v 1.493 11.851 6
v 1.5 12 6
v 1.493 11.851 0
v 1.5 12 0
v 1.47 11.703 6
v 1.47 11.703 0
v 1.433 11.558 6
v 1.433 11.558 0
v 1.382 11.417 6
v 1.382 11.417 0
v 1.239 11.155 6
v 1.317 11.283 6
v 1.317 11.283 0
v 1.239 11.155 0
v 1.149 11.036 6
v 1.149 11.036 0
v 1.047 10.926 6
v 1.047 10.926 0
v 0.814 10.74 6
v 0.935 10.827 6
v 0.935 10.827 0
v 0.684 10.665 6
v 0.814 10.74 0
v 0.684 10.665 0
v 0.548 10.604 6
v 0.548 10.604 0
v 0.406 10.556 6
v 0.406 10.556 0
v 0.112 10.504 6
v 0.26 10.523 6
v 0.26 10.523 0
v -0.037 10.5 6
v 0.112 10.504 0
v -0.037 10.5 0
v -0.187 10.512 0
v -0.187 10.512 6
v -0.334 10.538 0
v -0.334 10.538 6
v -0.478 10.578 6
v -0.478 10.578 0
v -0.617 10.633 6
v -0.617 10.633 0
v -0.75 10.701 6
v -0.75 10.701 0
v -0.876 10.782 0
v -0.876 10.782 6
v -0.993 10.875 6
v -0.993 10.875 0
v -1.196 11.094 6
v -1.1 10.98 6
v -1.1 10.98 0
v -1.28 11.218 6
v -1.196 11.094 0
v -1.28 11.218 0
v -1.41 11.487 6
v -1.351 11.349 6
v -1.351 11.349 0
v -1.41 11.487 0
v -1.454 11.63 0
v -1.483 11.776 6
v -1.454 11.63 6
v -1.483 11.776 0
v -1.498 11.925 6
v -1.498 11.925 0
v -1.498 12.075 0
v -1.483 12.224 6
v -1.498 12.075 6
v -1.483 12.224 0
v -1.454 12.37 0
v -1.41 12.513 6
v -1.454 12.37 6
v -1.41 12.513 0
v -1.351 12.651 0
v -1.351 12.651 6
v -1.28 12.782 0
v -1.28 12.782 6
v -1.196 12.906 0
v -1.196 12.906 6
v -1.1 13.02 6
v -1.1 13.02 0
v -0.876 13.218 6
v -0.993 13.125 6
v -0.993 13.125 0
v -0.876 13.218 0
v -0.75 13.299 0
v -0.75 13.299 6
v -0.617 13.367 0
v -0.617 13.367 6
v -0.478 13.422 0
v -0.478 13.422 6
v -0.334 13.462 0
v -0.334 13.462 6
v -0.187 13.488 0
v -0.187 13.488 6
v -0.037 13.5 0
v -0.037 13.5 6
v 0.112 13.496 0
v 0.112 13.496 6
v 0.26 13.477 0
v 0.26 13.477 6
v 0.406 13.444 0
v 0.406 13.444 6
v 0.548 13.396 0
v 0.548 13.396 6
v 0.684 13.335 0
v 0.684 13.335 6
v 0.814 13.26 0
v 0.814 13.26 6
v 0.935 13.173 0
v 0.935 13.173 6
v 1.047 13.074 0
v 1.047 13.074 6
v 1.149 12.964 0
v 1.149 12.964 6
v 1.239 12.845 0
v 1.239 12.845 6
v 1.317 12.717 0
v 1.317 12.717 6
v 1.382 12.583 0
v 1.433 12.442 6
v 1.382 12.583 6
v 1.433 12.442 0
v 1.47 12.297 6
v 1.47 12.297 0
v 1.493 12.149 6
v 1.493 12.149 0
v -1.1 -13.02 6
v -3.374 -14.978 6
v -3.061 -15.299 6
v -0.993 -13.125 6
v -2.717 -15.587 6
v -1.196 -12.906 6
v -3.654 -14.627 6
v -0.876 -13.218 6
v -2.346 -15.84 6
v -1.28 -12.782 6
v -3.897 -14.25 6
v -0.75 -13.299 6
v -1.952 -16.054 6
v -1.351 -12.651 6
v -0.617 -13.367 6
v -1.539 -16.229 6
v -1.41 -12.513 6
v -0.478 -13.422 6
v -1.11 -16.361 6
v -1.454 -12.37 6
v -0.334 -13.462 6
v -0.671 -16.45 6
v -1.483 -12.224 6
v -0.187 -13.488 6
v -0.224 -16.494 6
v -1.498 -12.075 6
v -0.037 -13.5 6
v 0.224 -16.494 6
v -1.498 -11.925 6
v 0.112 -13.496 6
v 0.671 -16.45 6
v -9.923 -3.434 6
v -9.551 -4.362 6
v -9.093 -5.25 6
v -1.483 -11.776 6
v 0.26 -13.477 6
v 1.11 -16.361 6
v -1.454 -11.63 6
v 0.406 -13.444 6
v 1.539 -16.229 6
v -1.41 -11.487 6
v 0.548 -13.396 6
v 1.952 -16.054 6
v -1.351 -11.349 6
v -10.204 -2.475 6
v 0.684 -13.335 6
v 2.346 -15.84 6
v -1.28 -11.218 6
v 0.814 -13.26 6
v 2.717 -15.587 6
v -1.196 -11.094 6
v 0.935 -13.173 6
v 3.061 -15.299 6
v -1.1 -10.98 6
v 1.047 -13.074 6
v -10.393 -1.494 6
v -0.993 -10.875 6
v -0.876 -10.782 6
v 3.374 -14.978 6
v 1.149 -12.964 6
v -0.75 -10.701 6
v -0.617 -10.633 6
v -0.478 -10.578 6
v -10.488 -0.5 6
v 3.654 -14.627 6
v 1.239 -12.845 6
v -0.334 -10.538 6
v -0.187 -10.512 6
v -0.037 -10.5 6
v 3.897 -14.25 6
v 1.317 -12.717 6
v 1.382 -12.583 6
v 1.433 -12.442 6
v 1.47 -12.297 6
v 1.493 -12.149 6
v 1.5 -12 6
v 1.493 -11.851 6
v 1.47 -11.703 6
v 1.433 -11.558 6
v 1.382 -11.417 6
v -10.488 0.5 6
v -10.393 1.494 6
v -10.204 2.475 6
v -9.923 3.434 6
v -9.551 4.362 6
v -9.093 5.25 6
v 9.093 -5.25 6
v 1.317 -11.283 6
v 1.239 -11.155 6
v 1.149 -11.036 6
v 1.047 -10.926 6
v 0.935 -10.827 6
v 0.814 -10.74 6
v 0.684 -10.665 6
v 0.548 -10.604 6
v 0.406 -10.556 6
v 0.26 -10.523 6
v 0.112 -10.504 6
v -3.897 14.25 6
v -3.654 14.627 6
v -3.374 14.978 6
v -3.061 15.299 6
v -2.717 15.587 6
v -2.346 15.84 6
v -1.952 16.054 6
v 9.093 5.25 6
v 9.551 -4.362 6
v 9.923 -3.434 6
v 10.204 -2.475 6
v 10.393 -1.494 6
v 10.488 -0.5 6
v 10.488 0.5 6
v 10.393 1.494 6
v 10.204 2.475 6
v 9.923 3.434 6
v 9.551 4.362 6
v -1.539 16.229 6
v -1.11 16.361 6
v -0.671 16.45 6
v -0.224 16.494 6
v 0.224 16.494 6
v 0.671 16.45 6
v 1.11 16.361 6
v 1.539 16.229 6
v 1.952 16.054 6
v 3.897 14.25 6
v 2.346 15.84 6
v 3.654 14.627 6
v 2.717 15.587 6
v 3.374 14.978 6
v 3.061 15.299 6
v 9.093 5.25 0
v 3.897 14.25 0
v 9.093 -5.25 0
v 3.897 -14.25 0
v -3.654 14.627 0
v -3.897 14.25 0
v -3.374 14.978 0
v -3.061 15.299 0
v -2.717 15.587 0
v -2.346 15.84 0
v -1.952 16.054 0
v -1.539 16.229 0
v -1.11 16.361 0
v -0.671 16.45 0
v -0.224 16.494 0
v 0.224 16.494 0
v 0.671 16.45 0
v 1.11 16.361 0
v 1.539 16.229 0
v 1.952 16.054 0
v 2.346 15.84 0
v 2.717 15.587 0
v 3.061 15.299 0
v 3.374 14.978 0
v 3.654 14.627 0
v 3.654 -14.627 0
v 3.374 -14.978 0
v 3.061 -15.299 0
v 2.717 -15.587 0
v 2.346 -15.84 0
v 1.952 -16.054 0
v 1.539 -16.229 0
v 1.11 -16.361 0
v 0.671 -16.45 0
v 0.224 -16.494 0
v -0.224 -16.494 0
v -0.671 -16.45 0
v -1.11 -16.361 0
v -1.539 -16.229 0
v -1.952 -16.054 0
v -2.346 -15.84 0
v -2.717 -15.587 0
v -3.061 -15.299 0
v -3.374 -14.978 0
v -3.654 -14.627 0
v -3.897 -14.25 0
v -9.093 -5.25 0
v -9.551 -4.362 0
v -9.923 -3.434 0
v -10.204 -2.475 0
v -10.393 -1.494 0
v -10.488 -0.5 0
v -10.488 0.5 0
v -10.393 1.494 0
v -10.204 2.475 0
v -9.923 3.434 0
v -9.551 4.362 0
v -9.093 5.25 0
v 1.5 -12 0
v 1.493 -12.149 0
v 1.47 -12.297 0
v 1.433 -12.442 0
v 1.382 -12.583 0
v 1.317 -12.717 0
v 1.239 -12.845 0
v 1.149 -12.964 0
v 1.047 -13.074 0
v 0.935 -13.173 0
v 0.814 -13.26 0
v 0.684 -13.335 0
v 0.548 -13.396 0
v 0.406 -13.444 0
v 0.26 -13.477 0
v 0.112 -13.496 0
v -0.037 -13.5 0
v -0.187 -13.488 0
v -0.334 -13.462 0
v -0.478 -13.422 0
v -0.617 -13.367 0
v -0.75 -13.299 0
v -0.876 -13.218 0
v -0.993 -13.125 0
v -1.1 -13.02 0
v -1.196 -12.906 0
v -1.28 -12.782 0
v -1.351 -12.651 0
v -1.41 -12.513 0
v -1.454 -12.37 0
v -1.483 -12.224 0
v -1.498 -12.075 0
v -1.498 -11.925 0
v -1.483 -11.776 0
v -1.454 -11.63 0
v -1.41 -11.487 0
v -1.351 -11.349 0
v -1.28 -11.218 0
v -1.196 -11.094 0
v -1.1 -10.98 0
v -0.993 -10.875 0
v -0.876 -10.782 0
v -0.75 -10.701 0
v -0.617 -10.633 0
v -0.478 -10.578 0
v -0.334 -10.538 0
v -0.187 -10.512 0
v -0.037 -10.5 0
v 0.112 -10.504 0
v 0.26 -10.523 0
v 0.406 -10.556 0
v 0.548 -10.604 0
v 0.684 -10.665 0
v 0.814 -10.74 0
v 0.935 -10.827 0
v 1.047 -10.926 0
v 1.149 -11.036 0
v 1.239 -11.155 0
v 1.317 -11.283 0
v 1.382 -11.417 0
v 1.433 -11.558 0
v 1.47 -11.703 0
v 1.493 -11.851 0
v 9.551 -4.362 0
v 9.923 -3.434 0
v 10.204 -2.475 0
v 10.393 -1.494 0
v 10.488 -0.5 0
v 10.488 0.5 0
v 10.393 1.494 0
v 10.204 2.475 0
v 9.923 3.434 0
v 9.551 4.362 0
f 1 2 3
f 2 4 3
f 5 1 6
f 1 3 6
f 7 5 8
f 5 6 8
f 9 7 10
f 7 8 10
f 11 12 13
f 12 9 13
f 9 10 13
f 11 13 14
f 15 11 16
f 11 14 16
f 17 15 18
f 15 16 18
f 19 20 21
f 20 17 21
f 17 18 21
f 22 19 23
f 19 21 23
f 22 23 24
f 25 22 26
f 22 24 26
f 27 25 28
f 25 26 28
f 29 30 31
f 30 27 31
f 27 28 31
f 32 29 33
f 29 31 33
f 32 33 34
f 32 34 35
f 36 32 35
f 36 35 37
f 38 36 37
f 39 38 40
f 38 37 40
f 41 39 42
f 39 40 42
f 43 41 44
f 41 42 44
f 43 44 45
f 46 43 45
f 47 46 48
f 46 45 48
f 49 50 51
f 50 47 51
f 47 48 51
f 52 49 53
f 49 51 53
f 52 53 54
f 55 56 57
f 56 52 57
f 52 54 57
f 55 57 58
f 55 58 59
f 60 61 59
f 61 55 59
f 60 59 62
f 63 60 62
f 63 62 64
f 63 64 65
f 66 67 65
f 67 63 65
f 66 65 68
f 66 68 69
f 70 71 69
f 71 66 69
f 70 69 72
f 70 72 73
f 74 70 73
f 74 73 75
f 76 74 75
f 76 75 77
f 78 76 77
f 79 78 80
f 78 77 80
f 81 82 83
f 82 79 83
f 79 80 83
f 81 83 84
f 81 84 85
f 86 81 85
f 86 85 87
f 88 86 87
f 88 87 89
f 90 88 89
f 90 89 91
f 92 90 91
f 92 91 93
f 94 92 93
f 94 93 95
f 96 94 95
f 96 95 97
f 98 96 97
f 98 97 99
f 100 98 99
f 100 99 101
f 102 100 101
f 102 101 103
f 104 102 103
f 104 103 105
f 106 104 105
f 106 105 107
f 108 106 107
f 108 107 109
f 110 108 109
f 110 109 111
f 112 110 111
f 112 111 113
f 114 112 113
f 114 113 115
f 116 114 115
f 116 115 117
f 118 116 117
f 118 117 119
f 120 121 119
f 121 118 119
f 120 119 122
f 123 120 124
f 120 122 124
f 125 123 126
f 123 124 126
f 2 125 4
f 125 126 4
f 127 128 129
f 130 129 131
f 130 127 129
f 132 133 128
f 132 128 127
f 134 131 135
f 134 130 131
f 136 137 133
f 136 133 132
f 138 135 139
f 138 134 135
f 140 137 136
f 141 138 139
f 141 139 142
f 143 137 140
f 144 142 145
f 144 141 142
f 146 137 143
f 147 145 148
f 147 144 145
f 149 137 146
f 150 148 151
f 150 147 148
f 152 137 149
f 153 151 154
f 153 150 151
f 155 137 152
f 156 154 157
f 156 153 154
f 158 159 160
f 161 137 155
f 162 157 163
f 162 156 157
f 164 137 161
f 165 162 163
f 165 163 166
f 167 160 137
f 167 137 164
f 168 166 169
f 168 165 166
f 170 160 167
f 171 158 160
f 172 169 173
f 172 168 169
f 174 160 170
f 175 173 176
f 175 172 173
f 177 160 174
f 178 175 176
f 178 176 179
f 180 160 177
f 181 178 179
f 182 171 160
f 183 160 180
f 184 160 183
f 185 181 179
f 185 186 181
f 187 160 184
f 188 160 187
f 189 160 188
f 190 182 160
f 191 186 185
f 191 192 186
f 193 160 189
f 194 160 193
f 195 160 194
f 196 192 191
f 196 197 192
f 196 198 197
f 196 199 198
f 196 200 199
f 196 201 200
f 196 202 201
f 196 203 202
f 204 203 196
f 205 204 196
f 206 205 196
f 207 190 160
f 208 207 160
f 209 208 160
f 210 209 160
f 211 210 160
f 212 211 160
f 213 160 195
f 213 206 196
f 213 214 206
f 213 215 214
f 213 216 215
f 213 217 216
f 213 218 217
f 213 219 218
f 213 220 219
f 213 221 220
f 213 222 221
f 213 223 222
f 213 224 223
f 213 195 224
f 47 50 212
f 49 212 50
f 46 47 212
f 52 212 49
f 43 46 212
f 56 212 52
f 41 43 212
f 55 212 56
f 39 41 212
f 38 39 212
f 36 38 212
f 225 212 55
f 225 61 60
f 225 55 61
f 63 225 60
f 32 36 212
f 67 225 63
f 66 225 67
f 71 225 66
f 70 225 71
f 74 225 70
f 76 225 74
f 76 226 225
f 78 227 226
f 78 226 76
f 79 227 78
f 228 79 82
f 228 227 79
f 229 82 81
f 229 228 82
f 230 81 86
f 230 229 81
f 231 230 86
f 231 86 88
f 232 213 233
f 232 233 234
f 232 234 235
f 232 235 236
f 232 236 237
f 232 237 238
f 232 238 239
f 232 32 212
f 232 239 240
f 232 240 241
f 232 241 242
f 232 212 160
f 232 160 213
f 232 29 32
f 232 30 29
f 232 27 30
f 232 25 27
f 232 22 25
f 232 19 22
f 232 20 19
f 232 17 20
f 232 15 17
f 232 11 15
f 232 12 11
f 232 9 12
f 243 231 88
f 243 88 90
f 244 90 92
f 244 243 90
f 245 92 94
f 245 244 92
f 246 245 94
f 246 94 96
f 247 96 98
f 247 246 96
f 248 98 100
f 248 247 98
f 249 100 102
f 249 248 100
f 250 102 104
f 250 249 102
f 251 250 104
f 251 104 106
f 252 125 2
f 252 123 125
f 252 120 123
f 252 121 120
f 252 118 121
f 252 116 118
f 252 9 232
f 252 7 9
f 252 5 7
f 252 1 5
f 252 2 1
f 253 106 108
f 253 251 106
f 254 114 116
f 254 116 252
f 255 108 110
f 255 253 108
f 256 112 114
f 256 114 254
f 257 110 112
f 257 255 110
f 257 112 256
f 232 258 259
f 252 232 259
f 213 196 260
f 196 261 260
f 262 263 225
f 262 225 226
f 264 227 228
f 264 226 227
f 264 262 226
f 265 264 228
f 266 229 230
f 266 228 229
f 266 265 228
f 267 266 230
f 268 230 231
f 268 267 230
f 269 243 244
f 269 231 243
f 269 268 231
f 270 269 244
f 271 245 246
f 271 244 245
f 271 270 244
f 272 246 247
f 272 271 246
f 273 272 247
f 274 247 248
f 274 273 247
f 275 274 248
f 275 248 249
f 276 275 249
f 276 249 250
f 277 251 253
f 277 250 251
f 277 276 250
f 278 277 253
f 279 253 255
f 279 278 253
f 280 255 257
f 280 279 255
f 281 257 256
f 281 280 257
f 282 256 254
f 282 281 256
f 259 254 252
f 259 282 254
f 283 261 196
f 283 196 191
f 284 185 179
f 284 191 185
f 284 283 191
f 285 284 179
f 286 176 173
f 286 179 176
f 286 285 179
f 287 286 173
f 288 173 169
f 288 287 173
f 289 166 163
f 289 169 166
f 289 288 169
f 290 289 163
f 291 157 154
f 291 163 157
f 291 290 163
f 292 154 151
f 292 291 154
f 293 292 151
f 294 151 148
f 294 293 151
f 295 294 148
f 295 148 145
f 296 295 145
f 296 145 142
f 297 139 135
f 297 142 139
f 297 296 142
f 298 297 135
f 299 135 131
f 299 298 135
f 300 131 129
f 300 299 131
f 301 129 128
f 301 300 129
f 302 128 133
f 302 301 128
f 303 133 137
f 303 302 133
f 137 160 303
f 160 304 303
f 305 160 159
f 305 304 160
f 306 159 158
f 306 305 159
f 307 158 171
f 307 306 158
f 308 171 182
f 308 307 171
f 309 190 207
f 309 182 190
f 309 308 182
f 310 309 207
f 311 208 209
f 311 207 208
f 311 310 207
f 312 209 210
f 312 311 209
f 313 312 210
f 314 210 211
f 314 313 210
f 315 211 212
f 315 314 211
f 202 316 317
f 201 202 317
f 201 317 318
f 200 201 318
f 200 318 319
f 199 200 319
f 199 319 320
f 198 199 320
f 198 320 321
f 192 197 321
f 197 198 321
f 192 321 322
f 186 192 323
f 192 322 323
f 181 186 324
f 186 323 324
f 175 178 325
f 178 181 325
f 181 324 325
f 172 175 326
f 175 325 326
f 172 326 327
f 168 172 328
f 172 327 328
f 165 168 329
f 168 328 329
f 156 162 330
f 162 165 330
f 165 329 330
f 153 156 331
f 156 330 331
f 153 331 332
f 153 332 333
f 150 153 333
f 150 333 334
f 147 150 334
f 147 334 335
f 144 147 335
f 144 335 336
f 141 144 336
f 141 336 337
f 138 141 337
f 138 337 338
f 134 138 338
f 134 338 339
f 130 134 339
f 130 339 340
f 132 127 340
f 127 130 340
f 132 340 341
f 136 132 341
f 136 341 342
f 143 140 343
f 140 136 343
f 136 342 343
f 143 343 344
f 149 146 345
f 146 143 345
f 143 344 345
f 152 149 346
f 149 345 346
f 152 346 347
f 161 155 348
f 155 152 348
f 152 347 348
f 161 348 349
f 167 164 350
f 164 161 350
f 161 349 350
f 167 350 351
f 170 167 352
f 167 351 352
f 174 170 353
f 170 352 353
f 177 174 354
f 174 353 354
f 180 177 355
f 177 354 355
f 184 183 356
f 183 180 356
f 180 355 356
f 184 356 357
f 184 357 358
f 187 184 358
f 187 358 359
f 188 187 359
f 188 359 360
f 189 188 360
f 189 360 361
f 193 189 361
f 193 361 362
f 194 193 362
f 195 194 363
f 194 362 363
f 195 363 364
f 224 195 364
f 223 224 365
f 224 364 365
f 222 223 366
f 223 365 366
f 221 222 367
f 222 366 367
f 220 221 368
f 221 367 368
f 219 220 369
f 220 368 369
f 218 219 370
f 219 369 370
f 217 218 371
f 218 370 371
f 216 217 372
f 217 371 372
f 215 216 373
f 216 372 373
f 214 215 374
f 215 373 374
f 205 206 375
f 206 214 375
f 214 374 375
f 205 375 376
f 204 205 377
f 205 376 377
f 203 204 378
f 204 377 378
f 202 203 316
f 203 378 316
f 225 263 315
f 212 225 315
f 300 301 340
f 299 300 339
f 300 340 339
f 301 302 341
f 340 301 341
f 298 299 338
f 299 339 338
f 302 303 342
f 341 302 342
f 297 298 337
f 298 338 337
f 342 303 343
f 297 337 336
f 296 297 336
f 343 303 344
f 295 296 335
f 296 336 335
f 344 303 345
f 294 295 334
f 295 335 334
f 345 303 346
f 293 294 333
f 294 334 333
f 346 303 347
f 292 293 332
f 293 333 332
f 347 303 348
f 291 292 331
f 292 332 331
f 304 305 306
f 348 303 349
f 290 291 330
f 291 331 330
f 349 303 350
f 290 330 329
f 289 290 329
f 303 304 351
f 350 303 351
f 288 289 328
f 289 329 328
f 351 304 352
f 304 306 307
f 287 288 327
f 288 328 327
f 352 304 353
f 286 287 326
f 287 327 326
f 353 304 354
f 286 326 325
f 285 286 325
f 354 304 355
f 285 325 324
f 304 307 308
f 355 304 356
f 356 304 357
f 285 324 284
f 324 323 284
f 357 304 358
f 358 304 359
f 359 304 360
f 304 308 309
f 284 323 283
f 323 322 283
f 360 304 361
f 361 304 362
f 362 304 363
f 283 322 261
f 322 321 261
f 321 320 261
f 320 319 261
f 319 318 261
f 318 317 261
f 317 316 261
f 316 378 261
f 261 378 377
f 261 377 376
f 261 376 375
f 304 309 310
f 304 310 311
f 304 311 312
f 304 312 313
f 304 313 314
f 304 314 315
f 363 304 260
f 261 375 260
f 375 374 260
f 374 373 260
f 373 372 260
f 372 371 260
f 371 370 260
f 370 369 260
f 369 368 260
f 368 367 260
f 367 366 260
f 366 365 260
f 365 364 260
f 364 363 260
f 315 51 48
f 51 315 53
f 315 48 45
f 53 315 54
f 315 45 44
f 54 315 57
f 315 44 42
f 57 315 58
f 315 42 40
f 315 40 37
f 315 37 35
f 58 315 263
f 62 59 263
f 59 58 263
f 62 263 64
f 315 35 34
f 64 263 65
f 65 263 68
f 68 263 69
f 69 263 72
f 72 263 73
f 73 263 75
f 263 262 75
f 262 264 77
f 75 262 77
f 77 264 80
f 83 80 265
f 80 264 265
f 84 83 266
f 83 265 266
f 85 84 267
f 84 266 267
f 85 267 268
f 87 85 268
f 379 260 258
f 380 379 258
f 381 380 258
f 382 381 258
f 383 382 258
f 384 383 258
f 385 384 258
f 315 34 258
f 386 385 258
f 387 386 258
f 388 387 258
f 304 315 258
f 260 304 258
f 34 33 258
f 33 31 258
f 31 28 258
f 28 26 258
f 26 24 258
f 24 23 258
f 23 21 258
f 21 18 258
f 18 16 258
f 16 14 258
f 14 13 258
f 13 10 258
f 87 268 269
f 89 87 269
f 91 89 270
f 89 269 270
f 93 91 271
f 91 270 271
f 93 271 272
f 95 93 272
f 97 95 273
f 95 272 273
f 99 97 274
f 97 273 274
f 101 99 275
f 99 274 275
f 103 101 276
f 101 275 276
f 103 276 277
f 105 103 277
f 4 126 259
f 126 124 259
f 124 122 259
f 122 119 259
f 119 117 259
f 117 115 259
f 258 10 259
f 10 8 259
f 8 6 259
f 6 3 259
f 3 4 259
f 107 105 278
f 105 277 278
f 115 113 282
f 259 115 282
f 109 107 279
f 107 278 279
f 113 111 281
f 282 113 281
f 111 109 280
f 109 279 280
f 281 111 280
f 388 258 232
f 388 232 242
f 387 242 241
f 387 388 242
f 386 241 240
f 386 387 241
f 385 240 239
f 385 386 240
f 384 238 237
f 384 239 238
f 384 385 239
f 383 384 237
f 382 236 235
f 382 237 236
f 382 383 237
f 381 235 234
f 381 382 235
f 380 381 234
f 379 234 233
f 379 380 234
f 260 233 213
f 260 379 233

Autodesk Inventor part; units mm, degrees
ref_plane "YZ Plane" through (0, 0, 0) normal (1, 0, 0) x (0, 1, 0)
ref_plane "XZ Plane" through (0, 0, 0) normal (0, 1, 0) x (-1, 0, 0)
ref_plane "XY Plane" through (0, 0, 0) normal (0, 0, 1) x (1, 0, 0)
sketch "Sketch1" plane through (0, 0, 0) normal (0, 0, 1) x (1, 0, 0)
  circle A0 centre (0, -12) radius 1.5
  circle A1 centre (0, 12) radius 1.5
  line L0 (3.8971, -14.25) -> (9.0933, -5.25)
  arc A2 (9.0933, -5.25) -> (9.0933, 5.25) centre (0, 0) ccw
  line L1 (9.0933, 5.25) -> (3.8971, 14.25)
  arc A3 (3.8971, 14.25) -> (-3.8971, 14.25) centre (0, 12) ccw
  line L2 (-3.8971, 14.25) -> (-9.0933, 5.25)
  arc A4 (-9.0933, 5.25) -> (-9.0933, -5.25) centre (0, 0) ccw
  line L3 (-9.0933, -5.25) -> (-3.8971, -14.25)
  arc A5 (-3.8971, -14.25) -> (3.8971, -14.25) centre (0, -12) ccw
extrude "Extrusion1" add sketch "Sketch1" along normal blind 6
properties part number "shaftPlug"
